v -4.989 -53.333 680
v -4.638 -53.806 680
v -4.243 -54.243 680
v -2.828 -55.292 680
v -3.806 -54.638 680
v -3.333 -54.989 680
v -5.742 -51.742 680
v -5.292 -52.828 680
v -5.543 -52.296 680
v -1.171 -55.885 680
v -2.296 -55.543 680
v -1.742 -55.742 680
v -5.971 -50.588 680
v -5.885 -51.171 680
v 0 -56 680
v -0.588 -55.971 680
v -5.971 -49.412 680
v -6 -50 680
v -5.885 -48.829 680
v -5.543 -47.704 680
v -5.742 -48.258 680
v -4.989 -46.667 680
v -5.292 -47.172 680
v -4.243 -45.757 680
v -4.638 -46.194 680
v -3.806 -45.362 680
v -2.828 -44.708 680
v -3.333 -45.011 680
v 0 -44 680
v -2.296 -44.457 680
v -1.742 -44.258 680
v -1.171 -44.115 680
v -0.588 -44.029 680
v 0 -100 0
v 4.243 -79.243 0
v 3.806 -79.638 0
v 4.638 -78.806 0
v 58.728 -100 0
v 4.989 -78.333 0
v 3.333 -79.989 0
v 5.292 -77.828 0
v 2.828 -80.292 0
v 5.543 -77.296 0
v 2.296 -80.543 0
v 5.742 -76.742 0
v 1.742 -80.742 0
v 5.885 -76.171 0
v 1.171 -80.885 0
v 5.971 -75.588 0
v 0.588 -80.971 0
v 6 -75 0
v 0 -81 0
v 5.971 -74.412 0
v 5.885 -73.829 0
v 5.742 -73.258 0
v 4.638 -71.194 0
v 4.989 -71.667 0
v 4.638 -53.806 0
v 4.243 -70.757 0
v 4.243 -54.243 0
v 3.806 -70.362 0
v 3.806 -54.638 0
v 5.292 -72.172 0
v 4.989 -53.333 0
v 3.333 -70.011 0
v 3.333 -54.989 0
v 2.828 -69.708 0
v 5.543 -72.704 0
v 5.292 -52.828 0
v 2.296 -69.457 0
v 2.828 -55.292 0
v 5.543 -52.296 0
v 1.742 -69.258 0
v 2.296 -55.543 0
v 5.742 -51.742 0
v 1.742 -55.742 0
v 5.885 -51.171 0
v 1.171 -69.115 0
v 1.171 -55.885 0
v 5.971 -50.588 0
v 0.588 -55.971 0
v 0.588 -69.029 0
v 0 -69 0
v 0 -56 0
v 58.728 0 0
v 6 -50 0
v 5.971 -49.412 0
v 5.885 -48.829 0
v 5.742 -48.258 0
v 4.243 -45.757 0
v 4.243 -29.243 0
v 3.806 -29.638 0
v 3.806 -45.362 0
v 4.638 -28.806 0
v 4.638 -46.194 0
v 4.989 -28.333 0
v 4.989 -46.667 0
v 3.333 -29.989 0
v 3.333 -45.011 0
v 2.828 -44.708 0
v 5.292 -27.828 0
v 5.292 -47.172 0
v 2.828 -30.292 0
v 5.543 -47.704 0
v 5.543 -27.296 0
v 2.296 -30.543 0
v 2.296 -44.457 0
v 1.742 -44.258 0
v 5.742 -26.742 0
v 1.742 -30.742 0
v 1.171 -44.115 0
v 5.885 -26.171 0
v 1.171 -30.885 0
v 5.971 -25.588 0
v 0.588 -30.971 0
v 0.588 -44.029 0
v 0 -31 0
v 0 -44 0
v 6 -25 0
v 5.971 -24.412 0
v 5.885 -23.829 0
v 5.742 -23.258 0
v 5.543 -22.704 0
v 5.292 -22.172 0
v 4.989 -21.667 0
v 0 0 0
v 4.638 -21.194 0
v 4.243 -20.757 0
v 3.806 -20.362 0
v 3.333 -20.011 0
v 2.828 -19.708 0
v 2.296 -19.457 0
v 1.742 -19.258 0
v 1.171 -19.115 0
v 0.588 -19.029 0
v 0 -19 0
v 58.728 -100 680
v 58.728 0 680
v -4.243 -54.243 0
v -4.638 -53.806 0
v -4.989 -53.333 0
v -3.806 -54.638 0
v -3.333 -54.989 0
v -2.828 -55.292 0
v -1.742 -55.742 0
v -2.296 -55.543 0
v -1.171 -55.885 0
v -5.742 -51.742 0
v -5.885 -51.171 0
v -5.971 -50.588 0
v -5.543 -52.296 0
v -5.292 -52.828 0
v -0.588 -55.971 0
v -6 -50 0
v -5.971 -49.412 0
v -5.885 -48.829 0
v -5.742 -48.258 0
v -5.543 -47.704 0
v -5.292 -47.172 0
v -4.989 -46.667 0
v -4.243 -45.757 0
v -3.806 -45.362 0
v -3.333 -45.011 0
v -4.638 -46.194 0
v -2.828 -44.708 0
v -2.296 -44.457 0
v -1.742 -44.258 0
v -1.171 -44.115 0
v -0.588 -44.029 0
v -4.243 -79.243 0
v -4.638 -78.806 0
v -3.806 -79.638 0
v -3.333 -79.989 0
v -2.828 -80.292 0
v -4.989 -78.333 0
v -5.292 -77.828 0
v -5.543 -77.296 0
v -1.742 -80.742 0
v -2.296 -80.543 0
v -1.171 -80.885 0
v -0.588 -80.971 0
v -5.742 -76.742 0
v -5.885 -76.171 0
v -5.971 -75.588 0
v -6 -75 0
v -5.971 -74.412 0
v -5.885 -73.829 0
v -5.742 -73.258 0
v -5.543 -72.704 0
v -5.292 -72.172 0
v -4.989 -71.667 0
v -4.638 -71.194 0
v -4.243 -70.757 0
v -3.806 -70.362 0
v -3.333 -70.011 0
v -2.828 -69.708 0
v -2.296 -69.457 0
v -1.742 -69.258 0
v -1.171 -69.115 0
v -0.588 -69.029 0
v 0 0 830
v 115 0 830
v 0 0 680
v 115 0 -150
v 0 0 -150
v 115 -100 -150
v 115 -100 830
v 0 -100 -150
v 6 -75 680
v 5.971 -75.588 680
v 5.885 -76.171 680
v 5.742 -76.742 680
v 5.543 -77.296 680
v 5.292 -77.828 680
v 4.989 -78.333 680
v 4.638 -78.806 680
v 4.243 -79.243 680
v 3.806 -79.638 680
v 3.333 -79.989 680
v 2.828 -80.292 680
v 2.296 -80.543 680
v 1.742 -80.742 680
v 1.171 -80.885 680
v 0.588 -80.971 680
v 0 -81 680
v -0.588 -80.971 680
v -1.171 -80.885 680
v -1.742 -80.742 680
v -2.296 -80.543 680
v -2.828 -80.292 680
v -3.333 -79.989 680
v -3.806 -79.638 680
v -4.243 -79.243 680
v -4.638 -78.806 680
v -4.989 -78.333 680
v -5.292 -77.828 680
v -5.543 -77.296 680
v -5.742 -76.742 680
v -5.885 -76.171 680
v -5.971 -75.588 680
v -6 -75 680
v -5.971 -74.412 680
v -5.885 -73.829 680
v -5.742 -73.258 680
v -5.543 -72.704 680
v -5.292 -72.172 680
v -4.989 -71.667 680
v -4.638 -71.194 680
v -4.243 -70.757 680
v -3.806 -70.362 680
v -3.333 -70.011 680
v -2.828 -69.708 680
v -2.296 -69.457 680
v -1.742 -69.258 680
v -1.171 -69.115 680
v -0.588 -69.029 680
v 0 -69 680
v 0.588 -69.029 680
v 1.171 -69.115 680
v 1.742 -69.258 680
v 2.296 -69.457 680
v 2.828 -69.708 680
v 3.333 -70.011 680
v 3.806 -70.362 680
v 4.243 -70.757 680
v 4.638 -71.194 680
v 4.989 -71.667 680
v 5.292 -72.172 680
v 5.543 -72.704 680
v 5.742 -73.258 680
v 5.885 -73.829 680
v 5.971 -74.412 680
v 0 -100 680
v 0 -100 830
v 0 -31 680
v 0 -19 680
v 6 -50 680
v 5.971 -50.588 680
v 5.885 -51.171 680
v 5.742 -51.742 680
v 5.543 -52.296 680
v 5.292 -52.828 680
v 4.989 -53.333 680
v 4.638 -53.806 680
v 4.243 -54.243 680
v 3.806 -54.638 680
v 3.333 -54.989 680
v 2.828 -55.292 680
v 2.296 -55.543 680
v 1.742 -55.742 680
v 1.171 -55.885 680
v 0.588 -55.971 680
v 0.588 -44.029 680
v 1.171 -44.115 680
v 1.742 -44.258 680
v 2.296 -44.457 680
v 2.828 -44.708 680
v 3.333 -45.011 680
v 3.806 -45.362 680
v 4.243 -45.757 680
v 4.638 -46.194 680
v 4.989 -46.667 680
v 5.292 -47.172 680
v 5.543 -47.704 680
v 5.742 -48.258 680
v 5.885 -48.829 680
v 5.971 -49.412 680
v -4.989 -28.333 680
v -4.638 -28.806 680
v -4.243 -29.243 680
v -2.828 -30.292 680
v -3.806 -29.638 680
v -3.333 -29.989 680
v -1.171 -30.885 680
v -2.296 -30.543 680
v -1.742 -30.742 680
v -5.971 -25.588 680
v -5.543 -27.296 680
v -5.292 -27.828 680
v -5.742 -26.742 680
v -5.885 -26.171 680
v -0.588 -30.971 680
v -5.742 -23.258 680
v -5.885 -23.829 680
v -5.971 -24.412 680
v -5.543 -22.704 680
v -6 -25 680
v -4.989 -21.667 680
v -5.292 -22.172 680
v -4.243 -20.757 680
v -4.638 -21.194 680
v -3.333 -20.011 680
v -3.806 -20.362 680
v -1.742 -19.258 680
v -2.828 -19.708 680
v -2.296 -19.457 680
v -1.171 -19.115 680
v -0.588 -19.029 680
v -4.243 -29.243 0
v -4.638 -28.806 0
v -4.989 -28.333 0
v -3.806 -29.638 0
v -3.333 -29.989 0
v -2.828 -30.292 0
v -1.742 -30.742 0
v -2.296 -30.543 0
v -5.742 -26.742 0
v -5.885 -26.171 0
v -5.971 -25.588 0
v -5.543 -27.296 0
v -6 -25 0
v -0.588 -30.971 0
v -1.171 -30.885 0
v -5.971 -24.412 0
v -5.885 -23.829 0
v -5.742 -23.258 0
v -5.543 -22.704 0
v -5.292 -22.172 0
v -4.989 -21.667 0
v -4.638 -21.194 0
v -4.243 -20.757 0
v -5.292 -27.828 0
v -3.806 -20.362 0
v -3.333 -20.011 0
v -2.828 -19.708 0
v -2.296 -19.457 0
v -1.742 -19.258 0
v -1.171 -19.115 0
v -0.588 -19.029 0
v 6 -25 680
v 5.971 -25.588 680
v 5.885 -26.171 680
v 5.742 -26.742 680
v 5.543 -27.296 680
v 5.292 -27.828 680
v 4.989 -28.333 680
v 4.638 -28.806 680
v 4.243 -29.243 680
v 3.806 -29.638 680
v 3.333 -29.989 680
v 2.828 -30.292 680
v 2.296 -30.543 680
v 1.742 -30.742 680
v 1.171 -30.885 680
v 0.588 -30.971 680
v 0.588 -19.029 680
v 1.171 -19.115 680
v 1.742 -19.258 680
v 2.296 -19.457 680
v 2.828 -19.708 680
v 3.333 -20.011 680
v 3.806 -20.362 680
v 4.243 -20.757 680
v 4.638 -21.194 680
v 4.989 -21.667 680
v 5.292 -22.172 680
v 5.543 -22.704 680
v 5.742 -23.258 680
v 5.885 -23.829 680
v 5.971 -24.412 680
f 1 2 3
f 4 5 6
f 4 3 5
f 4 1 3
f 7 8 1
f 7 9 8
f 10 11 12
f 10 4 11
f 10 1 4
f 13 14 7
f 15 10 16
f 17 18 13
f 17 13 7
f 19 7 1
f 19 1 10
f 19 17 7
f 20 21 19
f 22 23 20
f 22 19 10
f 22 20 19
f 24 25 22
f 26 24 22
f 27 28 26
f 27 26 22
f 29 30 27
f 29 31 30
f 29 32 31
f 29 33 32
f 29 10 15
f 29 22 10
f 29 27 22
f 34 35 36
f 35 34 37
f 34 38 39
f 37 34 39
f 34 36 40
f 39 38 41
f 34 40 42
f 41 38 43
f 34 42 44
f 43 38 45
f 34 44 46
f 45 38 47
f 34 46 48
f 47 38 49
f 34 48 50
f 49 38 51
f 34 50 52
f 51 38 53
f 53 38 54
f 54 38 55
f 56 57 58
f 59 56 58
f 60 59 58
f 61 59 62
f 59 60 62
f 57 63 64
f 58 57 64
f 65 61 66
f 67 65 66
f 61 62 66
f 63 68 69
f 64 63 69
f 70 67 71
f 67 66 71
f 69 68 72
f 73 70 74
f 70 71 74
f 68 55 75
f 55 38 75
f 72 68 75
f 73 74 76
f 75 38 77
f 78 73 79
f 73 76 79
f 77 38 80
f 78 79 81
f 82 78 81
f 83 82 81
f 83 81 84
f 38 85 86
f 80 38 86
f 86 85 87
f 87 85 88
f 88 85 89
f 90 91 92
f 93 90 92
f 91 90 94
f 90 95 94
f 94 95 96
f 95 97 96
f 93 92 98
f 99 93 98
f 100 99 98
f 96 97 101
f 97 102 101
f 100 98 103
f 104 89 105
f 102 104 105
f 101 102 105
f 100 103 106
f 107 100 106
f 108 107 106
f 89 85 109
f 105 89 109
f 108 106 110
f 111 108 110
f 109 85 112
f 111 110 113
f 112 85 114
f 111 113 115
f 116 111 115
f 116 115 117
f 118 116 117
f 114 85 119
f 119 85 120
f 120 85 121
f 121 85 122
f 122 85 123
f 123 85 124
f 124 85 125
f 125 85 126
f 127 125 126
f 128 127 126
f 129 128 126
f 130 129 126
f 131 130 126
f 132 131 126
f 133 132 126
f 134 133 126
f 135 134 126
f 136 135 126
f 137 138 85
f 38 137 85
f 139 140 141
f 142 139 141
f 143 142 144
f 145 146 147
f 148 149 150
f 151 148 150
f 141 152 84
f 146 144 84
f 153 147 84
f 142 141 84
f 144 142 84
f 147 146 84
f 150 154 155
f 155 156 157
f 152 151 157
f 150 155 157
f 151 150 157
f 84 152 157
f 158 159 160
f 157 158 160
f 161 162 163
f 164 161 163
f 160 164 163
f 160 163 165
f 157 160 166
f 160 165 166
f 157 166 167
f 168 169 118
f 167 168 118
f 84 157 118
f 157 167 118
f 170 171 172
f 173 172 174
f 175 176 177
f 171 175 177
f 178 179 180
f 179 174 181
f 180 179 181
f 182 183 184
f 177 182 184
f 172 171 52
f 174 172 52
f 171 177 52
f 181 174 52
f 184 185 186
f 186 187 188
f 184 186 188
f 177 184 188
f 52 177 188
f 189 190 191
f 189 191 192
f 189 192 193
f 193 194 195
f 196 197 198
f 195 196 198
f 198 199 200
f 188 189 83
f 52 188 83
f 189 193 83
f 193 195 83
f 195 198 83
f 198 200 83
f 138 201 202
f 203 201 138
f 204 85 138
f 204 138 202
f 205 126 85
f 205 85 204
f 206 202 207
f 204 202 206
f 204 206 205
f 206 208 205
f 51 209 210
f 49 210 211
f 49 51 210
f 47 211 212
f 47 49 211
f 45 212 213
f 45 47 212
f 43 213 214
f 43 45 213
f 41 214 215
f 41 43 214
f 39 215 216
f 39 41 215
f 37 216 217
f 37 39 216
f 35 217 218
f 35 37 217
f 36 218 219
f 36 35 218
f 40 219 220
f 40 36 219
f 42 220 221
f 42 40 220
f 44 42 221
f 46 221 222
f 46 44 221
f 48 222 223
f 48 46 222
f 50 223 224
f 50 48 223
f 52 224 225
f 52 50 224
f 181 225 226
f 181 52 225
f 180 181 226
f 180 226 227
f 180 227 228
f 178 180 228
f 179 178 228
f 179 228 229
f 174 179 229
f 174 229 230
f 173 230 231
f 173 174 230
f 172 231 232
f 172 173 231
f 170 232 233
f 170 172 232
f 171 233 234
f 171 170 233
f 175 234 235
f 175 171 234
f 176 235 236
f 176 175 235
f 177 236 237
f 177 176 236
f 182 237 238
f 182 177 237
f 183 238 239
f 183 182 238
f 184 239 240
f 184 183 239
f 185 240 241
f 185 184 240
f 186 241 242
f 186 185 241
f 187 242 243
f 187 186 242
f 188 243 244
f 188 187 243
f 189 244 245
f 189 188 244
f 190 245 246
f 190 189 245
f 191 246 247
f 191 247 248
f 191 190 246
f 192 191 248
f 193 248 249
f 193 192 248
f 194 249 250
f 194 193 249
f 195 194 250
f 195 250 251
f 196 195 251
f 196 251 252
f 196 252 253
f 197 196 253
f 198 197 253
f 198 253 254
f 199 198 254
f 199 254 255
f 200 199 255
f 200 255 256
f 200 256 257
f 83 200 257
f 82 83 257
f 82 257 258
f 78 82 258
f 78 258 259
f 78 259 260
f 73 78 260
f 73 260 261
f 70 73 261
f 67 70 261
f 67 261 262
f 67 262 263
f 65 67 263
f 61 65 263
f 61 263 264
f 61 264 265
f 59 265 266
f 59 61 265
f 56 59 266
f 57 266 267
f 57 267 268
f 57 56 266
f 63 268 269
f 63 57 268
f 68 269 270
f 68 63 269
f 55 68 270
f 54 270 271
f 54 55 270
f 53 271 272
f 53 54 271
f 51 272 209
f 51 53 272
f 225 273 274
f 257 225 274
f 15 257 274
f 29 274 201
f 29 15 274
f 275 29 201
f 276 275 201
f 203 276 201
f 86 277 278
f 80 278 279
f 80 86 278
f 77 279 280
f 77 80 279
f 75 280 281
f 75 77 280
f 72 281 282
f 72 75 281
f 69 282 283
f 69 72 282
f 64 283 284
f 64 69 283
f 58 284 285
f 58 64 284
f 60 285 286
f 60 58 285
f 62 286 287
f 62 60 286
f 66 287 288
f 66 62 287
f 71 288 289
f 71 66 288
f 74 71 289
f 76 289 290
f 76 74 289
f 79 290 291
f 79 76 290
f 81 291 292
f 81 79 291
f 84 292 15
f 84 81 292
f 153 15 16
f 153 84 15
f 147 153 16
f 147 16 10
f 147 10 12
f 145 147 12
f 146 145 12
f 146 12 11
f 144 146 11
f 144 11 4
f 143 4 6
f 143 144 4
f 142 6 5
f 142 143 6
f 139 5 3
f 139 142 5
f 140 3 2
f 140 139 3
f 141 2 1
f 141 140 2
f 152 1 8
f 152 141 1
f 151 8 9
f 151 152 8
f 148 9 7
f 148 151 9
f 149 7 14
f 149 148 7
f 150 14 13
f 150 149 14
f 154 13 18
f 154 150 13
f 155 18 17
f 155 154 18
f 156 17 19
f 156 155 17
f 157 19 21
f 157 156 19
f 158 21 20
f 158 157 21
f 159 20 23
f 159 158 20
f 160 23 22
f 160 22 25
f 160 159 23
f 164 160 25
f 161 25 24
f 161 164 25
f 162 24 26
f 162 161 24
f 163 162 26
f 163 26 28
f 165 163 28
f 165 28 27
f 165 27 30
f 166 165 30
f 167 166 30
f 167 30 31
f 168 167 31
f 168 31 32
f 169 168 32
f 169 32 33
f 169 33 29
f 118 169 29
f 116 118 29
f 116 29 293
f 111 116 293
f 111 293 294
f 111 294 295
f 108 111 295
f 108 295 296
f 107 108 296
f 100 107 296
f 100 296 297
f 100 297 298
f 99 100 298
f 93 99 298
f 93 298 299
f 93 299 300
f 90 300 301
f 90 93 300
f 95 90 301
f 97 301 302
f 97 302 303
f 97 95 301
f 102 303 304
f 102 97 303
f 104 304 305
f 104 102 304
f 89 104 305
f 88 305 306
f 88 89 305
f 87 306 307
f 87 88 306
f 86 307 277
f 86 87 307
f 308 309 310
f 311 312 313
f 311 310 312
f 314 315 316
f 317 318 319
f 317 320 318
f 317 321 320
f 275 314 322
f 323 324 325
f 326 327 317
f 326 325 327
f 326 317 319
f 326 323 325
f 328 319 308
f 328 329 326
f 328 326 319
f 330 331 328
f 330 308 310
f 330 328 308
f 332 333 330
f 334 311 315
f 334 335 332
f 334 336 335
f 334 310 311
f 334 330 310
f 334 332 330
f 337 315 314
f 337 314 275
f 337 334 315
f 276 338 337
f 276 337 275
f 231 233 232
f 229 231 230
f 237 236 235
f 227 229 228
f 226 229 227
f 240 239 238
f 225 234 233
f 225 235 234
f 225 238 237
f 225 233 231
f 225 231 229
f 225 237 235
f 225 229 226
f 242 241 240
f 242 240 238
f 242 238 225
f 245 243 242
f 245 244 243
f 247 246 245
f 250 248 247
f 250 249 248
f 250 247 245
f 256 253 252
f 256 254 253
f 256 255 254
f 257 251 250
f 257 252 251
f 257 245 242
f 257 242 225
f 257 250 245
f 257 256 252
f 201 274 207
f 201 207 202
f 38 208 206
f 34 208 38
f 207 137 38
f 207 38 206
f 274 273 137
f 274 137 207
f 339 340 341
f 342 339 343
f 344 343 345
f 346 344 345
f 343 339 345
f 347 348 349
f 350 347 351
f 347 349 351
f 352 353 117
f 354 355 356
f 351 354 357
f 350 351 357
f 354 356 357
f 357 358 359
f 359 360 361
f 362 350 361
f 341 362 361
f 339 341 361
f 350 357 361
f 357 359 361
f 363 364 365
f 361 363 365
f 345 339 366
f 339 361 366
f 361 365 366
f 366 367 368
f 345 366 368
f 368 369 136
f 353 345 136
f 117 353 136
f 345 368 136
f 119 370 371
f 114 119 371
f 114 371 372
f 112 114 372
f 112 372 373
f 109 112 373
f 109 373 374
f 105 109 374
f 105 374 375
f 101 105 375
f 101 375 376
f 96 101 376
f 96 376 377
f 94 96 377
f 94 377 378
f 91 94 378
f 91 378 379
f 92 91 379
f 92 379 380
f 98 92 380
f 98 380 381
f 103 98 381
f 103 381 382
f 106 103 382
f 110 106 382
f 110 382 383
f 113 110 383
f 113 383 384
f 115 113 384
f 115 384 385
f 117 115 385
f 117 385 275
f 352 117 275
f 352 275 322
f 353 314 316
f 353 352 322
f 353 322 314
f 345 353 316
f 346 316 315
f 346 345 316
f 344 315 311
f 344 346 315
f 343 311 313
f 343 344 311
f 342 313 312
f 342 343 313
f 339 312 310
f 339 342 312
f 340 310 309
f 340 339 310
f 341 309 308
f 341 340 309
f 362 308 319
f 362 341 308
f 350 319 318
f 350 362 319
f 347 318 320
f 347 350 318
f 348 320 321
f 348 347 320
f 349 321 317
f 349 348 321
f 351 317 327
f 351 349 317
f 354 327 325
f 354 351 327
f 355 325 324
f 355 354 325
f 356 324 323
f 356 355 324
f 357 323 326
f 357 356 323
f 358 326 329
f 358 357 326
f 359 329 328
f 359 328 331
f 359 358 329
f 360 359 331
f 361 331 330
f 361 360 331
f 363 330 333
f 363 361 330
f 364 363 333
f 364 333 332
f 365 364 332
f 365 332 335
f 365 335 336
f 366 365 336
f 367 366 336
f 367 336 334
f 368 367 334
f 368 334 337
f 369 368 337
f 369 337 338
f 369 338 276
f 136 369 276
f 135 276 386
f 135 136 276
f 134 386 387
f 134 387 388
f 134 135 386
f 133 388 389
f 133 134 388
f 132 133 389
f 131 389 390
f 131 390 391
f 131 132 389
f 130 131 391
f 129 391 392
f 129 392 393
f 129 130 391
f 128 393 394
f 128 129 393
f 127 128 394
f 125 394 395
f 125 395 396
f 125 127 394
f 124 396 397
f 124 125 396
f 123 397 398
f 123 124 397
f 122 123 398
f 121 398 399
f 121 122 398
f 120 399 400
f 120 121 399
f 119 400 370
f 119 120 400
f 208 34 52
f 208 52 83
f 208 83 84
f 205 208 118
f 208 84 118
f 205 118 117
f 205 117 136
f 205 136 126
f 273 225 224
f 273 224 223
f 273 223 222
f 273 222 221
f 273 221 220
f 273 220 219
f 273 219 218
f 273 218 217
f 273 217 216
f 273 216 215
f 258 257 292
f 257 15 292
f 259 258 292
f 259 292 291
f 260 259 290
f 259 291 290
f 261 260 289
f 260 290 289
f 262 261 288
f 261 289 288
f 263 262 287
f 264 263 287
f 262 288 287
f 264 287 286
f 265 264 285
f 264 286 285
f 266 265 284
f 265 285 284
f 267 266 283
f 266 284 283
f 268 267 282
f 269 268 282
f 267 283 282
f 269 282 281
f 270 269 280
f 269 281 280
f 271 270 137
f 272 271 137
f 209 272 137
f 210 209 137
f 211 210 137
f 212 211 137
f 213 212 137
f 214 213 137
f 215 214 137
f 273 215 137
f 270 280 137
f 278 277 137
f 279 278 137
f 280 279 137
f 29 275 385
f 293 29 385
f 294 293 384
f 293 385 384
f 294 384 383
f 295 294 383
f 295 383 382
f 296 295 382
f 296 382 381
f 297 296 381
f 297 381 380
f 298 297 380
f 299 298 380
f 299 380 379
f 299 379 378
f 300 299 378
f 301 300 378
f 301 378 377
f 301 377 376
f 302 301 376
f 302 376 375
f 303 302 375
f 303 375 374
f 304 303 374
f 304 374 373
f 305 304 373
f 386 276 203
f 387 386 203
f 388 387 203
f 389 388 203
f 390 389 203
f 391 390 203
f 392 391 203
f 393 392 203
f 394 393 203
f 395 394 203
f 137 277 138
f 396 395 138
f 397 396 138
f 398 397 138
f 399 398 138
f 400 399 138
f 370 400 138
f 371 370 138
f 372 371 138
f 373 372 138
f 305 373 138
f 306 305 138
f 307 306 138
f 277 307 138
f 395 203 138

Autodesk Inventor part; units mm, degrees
ref_plane "YZ Plane" through (0, 0, 0) normal (1, 0, 0) x (0, 1, 0)
ref_plane "XZ Plane" through (0, 0, 0) normal (0, 1, 0) x (-1, 0, 0)
ref_plane "XY Plane" through (0, 0, 0) normal (0, 0, 1) x (1, 0, 0)
sketch "Sketch1" plane through (0, 0, 0) normal (1, 0, 0) x (0, 1, 0)
  line L0 (0, 0) -> (-100, 0)
  line L1 (-100, 0) -> (-100, -150)
  line L2 (-100, -150) -> (0, -150)
  line L3 (0, -150) -> (0, 0)
  dimension "d0" = 100
  dimension "d1" = 150
extrude "Extrusion1" add sketch "Sketch1" along normal blind 15
sketch "Sketch2" plane through (0, -100, 0) normal (0, 0, 1) x (1, 0, 0)
  line L0 (0, 100) -> (0, 0) projected
  line L1 (0, 100) -> (0, 0)
  line L2 (0, 0) -> (0, 19)
  line L3 (0, 100) -> (0, 81)
  line L4 (0, 81) -> (0, 75)
  line L5 (0, 75) -> (0, 69)
  circle A0 centre (0, 75) radius 6
  line L6 (0, 69) -> (0, 56)
  line L7 (0, 56) -> (0, 50)
  circle A1 centre (0, 50) radius 6
  line L8 (0, 44) -> (0, 31)
  line L9 (0, 31) -> (0, 25)
  circle A2 centre (0, 25) radius 6
  dimension "d11" = 12
  dimension "d4" = 19
  dimension "d5" = 19
  dimension "d6" = 6
  dimension "d7" = 6
  dimension "d8" = 12
  dimension "d9" = 13
  dimension "d10" = 6
  dimension "d12" = 13
  dimension "d13" = 6
  dimension "d14" = 12
extrude "Extrusion2" add sketch "Sketch2" along normal blind 680
sketch "Sketch3" plane through (0, -25, 680) normal (0, 0, 1) x (1, 0, 0)
  line L0 (0, -75) -> (0, 25) projected
  line L1 (15, 25) -> (15, -75) projected
  line L2 (0, 25) -> (15, 25)
  line L3 (15, 25) -> (15, -75)
  line L4 (15, -75) -> (0, -75)
  line L5 (0, -75) -> (0, 25)
extrude "Extrusion3" add sketch "Sketch3" along normal blind 150
sketch "Sketch4" plane through (15, -100, 680) normal (1, 0, 0) x (0, 0, -1)
  line L0 (0, 100) -> (-150, 100) projected
  line L1 (830, 0) -> (830, 100) projected
  line L2 (-150, 100) -> (830, 100)
  line L3 (830, 100) -> (830, 0)
  line L4 (830, 0) -> (-150, 0)
  line L5 (-150, 0) -> (-150, 100)
  point P0 (680, 100)
extrude "Extrusion4" add sketch "Sketch4" along normal blind 100
sketch "Sketch5" plane through (0, 0, 0) normal (0, 1, 0) x (1, 0, 0)
  line L0 (15, -680) -> (0, -680) projected
  line L1 (15, -680) -> (58.7284, -680)
  line L2 (58.7284, -680) -> (58.7284, 0)
  line L3 (58.7284, 0) -> (15, 0)
  line L4 (15, 0) -> (15, -680)
  point P0 (0, 0)
extrude "Extrusion5" cut sketch "Sketch5" along normal through all both and the other way through all
properties part number "support"
